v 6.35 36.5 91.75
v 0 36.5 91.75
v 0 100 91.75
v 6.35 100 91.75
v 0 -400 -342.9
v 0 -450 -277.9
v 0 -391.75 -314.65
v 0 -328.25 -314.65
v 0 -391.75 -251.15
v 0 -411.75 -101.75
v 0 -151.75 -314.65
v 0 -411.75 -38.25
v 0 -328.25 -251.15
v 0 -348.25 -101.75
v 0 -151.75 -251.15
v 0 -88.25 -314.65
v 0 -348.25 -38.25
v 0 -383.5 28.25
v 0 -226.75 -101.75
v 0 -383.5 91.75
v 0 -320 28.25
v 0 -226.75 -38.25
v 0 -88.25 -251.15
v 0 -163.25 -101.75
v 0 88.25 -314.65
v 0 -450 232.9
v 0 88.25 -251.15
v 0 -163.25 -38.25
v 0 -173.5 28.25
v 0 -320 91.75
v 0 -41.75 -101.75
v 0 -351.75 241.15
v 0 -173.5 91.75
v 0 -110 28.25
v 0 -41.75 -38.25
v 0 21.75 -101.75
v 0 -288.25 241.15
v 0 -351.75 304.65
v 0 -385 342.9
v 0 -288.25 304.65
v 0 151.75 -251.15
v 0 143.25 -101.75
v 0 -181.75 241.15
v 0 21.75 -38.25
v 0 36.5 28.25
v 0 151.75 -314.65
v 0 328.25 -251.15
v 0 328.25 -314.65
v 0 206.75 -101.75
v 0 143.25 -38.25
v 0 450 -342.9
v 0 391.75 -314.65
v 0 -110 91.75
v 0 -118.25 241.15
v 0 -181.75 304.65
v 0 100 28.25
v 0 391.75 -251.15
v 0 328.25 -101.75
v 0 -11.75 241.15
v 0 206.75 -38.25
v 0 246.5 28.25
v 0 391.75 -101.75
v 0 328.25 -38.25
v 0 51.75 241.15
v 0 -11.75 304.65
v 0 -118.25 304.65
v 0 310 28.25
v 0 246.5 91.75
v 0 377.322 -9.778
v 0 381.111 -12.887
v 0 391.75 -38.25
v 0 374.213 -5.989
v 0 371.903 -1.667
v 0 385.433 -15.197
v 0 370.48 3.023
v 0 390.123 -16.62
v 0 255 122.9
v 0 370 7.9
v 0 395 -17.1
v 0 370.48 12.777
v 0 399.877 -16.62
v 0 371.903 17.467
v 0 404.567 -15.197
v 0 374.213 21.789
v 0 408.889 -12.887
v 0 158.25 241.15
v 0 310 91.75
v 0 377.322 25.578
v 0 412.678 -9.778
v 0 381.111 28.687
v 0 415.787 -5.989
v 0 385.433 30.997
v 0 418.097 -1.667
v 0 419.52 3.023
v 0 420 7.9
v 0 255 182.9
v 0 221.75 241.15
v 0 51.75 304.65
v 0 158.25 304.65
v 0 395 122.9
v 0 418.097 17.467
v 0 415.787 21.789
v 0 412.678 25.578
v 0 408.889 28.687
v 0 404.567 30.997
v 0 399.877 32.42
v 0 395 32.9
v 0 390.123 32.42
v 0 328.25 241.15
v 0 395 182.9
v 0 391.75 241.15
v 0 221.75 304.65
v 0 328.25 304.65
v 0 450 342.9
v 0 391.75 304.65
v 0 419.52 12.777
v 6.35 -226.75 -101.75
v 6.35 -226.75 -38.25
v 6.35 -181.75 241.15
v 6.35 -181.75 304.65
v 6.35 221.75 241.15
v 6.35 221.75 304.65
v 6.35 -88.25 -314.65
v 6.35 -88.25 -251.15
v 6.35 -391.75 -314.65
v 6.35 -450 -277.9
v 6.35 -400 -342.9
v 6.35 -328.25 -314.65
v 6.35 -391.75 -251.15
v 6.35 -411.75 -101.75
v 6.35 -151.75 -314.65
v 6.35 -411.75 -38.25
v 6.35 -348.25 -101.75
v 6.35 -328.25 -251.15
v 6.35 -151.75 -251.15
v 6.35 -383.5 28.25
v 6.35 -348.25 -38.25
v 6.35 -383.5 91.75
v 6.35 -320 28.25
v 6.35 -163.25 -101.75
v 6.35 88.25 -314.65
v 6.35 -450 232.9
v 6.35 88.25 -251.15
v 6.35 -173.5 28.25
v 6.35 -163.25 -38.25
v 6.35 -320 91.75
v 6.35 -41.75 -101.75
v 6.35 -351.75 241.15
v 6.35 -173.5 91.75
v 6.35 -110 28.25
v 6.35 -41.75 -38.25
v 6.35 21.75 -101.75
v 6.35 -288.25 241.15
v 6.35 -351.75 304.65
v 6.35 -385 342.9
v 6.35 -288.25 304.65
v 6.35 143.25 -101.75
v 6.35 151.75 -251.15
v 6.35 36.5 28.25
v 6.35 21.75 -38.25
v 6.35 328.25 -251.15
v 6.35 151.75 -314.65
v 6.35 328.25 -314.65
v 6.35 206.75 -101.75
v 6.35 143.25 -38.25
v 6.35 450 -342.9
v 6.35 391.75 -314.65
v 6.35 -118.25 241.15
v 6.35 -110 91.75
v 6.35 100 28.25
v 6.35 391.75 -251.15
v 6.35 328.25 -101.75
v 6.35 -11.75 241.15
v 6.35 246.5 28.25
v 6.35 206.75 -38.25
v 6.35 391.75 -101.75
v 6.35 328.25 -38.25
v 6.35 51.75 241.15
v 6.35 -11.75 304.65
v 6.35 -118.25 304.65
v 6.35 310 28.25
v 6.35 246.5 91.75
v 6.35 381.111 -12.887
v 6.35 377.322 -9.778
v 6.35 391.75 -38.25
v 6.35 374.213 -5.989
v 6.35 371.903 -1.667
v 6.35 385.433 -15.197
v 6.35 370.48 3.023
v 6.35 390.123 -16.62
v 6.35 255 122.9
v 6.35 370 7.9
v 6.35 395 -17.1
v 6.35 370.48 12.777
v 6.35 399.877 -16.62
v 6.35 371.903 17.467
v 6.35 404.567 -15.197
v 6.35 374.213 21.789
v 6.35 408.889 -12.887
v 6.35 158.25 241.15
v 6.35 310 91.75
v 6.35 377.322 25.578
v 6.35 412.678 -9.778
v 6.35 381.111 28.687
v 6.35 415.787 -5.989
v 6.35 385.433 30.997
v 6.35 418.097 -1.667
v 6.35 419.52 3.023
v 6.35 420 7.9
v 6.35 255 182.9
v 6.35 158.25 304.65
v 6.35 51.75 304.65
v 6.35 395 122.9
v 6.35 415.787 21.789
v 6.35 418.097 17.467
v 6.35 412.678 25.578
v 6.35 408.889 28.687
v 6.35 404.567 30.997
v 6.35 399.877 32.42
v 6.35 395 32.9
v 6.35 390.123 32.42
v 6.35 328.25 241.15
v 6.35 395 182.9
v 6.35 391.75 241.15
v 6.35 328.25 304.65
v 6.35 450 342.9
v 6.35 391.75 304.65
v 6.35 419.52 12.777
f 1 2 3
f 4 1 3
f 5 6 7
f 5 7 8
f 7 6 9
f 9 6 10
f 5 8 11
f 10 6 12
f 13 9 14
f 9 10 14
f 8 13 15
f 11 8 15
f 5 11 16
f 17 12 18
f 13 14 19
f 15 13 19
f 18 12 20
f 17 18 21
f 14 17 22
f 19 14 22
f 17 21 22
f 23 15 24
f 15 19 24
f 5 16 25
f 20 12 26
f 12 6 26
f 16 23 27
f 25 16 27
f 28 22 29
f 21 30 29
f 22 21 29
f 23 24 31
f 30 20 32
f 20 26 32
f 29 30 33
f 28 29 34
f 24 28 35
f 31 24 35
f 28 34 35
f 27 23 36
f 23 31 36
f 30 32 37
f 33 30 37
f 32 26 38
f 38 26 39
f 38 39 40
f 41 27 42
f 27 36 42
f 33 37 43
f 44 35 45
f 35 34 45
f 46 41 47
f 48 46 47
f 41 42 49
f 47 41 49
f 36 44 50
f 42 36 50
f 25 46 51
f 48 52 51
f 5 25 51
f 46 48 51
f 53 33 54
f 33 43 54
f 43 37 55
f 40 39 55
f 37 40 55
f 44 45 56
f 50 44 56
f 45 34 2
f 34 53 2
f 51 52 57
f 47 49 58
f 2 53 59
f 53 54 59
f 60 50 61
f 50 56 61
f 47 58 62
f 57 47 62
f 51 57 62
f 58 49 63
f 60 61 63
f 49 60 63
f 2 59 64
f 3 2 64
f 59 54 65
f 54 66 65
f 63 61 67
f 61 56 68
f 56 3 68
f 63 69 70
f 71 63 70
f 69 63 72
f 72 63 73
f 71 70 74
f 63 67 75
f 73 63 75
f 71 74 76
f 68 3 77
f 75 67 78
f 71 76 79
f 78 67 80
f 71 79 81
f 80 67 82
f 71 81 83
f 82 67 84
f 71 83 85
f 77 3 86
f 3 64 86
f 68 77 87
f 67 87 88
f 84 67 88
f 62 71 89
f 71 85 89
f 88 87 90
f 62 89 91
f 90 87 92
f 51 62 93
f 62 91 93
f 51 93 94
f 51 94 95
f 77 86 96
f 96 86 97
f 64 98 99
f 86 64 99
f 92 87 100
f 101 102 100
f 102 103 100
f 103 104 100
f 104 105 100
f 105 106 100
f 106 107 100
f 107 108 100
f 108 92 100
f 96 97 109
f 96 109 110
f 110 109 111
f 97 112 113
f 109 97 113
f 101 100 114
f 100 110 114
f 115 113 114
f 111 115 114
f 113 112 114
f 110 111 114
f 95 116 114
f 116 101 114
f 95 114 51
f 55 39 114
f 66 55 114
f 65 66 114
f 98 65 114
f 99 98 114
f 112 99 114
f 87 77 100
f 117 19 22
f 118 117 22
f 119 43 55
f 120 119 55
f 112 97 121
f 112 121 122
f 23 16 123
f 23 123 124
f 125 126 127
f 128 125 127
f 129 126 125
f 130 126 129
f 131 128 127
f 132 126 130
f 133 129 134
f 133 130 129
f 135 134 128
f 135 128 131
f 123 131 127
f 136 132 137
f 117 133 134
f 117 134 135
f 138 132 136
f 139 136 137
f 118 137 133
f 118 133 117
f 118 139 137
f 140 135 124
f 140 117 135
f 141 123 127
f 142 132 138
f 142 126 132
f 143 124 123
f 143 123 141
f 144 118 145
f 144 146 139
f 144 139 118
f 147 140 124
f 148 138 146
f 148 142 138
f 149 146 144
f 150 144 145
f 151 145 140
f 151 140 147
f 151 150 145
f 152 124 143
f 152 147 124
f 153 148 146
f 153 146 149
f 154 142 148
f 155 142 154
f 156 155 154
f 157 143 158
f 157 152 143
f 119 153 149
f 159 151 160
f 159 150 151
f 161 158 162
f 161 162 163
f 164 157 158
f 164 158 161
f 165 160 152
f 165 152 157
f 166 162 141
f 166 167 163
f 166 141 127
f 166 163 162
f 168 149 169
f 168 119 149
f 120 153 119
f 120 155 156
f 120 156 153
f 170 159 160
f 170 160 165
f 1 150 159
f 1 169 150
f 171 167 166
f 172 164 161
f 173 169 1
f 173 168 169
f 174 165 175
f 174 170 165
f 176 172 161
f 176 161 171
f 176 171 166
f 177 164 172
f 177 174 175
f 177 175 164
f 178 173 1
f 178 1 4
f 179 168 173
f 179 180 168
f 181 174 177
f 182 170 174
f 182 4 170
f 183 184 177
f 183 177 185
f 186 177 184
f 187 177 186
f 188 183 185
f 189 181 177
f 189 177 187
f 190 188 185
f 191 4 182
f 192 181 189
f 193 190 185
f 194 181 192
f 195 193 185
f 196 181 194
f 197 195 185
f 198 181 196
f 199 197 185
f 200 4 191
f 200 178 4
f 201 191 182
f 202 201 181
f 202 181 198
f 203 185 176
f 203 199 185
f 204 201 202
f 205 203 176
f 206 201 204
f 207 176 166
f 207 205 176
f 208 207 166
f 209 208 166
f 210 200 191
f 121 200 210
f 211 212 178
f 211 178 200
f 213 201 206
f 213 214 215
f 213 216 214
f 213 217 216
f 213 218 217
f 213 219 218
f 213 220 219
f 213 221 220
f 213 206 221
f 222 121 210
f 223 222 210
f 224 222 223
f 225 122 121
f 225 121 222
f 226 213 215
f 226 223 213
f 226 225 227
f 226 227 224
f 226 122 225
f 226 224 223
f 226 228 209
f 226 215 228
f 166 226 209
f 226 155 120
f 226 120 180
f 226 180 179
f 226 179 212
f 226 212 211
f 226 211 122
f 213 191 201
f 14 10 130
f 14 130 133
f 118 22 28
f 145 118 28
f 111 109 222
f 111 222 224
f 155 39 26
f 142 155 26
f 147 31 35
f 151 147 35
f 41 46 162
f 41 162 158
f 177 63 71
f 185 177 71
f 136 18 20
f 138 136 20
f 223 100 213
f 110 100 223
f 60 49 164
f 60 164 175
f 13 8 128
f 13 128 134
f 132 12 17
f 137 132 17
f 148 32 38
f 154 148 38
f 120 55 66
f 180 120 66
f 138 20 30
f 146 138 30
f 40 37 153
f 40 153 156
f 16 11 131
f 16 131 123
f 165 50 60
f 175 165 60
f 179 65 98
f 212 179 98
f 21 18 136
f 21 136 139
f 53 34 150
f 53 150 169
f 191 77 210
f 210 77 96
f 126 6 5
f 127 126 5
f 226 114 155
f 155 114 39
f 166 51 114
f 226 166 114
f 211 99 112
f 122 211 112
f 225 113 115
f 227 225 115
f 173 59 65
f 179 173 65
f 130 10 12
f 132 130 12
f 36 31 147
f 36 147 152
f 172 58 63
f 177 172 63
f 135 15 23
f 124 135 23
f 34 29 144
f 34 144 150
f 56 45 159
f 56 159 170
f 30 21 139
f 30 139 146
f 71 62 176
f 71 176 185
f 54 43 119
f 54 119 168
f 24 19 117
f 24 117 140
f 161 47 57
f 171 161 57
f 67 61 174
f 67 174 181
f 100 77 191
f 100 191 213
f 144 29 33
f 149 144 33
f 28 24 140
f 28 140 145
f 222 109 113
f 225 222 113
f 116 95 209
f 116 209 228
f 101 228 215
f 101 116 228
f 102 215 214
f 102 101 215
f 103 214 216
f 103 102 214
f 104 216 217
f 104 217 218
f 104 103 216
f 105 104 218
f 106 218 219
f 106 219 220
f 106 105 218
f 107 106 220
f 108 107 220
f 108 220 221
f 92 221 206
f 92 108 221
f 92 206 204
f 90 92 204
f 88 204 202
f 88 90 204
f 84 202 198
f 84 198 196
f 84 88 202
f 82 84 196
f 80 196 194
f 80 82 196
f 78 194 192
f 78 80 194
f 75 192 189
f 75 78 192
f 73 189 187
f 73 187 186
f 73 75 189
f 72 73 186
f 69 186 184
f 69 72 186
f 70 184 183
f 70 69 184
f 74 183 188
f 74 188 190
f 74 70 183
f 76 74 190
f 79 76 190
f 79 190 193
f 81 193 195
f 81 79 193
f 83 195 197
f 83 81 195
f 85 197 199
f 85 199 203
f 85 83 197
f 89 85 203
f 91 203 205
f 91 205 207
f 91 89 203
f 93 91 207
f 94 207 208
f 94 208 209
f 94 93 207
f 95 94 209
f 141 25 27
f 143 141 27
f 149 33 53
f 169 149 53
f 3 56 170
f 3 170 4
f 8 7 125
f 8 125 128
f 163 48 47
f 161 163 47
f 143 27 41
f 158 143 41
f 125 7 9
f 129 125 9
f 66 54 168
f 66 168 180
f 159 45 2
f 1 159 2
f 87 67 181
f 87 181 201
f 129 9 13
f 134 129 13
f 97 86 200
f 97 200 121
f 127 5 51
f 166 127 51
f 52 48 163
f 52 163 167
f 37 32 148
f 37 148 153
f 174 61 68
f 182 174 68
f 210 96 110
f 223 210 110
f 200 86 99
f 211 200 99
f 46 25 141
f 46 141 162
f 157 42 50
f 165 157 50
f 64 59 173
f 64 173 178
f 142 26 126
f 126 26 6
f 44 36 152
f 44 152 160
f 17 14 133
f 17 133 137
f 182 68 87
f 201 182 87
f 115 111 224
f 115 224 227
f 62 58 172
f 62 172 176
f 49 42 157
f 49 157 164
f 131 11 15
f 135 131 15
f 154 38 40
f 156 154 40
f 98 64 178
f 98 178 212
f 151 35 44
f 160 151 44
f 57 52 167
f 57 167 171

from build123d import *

# Parameters (mm, degrees)
F0_W     = 63.5
F0_H     = 63.5
F0_R     = 25
F0_W_2   = 140
F0_H_2   = 60
F1_DEPTH = 6.35


# Not quite as in the source:
# - a length typed as a fraction of an inch, garbled in the dataset ("3 / 203.2 mm" for 3/8 in), is restored


with BuildPart() as f1:
    # F0 (on Right) → F1 (new body)
    with BuildSketch(Plane.YZ):
        Polygon((-400, -342.9), (450, -342.9), (450, 342.9), (-385, 342.9), (-450, 232.9), (-450, -277.9), align=None)
        with Locations((-360, -282.9)):
            Rectangle(F0_W, F0_H, mode=Mode.SUBTRACT)
        with Locations((-120, -282.9)):
            Rectangle(F0_W, F0_H, mode=Mode.SUBTRACT)
        with Locations((-380, -70)):
            Rectangle(F0_W, F0_H, mode=Mode.SUBTRACT)
        with Locations((-195, -70)):
            Rectangle(F0_W, F0_H, mode=Mode.SUBTRACT)
        with Locations((-10, -70)):
            Rectangle(F0_W, F0_H, mode=Mode.SUBTRACT)
        with Locations((120, -282.9)):
            Rectangle(F0_W, F0_H, mode=Mode.SUBTRACT)
        with Locations((360, -282.9)):
            Rectangle(F0_W, F0_H, mode=Mode.SUBTRACT)
        with Locations((175, -70)):
            Rectangle(F0_W, F0_H, mode=Mode.SUBTRACT)
        with Locations((360, -70)):
            Rectangle(F0_W, F0_H, mode=Mode.SUBTRACT)
        with Locations((-351.75, 60)):
            Rectangle(F0_W, F0_H, mode=Mode.SUBTRACT)
        with Locations((-141.75, 60)):
            Rectangle(F0_W, F0_H, mode=Mode.SUBTRACT)
        with Locations((-320, 272.9)):
            Rectangle(F0_W, F0_H, mode=Mode.SUBTRACT)
        with Locations((-150, 272.9)):
            Rectangle(F0_W, F0_H, mode=Mode.SUBTRACT)
        with Locations((68.25, 60)):
            Rectangle(F0_W, F0_H, mode=Mode.SUBTRACT)
        with Locations((278.25, 60)):
            Rectangle(F0_W, F0_H, mode=Mode.SUBTRACT)
        with Locations((395, 7.9)):
            Circle(F0_R, mode=Mode.SUBTRACT)
        with Locations((325, 152.9)):
            Rectangle(F0_W_2, F0_H_2, mode=Mode.SUBTRACT)
        with Locations((20, 272.9)):
            Rectangle(F0_W, F0_H, mode=Mode.SUBTRACT)
        with Locations((190, 272.9)):
            Rectangle(F0_W, F0_H, mode=Mode.SUBTRACT)
        with Locations((360, 272.9)):
            Rectangle(F0_W, F0_H, mode=Mode.SUBTRACT)
    extrude(amount=F1_DEPTH)


solid = f1.part
